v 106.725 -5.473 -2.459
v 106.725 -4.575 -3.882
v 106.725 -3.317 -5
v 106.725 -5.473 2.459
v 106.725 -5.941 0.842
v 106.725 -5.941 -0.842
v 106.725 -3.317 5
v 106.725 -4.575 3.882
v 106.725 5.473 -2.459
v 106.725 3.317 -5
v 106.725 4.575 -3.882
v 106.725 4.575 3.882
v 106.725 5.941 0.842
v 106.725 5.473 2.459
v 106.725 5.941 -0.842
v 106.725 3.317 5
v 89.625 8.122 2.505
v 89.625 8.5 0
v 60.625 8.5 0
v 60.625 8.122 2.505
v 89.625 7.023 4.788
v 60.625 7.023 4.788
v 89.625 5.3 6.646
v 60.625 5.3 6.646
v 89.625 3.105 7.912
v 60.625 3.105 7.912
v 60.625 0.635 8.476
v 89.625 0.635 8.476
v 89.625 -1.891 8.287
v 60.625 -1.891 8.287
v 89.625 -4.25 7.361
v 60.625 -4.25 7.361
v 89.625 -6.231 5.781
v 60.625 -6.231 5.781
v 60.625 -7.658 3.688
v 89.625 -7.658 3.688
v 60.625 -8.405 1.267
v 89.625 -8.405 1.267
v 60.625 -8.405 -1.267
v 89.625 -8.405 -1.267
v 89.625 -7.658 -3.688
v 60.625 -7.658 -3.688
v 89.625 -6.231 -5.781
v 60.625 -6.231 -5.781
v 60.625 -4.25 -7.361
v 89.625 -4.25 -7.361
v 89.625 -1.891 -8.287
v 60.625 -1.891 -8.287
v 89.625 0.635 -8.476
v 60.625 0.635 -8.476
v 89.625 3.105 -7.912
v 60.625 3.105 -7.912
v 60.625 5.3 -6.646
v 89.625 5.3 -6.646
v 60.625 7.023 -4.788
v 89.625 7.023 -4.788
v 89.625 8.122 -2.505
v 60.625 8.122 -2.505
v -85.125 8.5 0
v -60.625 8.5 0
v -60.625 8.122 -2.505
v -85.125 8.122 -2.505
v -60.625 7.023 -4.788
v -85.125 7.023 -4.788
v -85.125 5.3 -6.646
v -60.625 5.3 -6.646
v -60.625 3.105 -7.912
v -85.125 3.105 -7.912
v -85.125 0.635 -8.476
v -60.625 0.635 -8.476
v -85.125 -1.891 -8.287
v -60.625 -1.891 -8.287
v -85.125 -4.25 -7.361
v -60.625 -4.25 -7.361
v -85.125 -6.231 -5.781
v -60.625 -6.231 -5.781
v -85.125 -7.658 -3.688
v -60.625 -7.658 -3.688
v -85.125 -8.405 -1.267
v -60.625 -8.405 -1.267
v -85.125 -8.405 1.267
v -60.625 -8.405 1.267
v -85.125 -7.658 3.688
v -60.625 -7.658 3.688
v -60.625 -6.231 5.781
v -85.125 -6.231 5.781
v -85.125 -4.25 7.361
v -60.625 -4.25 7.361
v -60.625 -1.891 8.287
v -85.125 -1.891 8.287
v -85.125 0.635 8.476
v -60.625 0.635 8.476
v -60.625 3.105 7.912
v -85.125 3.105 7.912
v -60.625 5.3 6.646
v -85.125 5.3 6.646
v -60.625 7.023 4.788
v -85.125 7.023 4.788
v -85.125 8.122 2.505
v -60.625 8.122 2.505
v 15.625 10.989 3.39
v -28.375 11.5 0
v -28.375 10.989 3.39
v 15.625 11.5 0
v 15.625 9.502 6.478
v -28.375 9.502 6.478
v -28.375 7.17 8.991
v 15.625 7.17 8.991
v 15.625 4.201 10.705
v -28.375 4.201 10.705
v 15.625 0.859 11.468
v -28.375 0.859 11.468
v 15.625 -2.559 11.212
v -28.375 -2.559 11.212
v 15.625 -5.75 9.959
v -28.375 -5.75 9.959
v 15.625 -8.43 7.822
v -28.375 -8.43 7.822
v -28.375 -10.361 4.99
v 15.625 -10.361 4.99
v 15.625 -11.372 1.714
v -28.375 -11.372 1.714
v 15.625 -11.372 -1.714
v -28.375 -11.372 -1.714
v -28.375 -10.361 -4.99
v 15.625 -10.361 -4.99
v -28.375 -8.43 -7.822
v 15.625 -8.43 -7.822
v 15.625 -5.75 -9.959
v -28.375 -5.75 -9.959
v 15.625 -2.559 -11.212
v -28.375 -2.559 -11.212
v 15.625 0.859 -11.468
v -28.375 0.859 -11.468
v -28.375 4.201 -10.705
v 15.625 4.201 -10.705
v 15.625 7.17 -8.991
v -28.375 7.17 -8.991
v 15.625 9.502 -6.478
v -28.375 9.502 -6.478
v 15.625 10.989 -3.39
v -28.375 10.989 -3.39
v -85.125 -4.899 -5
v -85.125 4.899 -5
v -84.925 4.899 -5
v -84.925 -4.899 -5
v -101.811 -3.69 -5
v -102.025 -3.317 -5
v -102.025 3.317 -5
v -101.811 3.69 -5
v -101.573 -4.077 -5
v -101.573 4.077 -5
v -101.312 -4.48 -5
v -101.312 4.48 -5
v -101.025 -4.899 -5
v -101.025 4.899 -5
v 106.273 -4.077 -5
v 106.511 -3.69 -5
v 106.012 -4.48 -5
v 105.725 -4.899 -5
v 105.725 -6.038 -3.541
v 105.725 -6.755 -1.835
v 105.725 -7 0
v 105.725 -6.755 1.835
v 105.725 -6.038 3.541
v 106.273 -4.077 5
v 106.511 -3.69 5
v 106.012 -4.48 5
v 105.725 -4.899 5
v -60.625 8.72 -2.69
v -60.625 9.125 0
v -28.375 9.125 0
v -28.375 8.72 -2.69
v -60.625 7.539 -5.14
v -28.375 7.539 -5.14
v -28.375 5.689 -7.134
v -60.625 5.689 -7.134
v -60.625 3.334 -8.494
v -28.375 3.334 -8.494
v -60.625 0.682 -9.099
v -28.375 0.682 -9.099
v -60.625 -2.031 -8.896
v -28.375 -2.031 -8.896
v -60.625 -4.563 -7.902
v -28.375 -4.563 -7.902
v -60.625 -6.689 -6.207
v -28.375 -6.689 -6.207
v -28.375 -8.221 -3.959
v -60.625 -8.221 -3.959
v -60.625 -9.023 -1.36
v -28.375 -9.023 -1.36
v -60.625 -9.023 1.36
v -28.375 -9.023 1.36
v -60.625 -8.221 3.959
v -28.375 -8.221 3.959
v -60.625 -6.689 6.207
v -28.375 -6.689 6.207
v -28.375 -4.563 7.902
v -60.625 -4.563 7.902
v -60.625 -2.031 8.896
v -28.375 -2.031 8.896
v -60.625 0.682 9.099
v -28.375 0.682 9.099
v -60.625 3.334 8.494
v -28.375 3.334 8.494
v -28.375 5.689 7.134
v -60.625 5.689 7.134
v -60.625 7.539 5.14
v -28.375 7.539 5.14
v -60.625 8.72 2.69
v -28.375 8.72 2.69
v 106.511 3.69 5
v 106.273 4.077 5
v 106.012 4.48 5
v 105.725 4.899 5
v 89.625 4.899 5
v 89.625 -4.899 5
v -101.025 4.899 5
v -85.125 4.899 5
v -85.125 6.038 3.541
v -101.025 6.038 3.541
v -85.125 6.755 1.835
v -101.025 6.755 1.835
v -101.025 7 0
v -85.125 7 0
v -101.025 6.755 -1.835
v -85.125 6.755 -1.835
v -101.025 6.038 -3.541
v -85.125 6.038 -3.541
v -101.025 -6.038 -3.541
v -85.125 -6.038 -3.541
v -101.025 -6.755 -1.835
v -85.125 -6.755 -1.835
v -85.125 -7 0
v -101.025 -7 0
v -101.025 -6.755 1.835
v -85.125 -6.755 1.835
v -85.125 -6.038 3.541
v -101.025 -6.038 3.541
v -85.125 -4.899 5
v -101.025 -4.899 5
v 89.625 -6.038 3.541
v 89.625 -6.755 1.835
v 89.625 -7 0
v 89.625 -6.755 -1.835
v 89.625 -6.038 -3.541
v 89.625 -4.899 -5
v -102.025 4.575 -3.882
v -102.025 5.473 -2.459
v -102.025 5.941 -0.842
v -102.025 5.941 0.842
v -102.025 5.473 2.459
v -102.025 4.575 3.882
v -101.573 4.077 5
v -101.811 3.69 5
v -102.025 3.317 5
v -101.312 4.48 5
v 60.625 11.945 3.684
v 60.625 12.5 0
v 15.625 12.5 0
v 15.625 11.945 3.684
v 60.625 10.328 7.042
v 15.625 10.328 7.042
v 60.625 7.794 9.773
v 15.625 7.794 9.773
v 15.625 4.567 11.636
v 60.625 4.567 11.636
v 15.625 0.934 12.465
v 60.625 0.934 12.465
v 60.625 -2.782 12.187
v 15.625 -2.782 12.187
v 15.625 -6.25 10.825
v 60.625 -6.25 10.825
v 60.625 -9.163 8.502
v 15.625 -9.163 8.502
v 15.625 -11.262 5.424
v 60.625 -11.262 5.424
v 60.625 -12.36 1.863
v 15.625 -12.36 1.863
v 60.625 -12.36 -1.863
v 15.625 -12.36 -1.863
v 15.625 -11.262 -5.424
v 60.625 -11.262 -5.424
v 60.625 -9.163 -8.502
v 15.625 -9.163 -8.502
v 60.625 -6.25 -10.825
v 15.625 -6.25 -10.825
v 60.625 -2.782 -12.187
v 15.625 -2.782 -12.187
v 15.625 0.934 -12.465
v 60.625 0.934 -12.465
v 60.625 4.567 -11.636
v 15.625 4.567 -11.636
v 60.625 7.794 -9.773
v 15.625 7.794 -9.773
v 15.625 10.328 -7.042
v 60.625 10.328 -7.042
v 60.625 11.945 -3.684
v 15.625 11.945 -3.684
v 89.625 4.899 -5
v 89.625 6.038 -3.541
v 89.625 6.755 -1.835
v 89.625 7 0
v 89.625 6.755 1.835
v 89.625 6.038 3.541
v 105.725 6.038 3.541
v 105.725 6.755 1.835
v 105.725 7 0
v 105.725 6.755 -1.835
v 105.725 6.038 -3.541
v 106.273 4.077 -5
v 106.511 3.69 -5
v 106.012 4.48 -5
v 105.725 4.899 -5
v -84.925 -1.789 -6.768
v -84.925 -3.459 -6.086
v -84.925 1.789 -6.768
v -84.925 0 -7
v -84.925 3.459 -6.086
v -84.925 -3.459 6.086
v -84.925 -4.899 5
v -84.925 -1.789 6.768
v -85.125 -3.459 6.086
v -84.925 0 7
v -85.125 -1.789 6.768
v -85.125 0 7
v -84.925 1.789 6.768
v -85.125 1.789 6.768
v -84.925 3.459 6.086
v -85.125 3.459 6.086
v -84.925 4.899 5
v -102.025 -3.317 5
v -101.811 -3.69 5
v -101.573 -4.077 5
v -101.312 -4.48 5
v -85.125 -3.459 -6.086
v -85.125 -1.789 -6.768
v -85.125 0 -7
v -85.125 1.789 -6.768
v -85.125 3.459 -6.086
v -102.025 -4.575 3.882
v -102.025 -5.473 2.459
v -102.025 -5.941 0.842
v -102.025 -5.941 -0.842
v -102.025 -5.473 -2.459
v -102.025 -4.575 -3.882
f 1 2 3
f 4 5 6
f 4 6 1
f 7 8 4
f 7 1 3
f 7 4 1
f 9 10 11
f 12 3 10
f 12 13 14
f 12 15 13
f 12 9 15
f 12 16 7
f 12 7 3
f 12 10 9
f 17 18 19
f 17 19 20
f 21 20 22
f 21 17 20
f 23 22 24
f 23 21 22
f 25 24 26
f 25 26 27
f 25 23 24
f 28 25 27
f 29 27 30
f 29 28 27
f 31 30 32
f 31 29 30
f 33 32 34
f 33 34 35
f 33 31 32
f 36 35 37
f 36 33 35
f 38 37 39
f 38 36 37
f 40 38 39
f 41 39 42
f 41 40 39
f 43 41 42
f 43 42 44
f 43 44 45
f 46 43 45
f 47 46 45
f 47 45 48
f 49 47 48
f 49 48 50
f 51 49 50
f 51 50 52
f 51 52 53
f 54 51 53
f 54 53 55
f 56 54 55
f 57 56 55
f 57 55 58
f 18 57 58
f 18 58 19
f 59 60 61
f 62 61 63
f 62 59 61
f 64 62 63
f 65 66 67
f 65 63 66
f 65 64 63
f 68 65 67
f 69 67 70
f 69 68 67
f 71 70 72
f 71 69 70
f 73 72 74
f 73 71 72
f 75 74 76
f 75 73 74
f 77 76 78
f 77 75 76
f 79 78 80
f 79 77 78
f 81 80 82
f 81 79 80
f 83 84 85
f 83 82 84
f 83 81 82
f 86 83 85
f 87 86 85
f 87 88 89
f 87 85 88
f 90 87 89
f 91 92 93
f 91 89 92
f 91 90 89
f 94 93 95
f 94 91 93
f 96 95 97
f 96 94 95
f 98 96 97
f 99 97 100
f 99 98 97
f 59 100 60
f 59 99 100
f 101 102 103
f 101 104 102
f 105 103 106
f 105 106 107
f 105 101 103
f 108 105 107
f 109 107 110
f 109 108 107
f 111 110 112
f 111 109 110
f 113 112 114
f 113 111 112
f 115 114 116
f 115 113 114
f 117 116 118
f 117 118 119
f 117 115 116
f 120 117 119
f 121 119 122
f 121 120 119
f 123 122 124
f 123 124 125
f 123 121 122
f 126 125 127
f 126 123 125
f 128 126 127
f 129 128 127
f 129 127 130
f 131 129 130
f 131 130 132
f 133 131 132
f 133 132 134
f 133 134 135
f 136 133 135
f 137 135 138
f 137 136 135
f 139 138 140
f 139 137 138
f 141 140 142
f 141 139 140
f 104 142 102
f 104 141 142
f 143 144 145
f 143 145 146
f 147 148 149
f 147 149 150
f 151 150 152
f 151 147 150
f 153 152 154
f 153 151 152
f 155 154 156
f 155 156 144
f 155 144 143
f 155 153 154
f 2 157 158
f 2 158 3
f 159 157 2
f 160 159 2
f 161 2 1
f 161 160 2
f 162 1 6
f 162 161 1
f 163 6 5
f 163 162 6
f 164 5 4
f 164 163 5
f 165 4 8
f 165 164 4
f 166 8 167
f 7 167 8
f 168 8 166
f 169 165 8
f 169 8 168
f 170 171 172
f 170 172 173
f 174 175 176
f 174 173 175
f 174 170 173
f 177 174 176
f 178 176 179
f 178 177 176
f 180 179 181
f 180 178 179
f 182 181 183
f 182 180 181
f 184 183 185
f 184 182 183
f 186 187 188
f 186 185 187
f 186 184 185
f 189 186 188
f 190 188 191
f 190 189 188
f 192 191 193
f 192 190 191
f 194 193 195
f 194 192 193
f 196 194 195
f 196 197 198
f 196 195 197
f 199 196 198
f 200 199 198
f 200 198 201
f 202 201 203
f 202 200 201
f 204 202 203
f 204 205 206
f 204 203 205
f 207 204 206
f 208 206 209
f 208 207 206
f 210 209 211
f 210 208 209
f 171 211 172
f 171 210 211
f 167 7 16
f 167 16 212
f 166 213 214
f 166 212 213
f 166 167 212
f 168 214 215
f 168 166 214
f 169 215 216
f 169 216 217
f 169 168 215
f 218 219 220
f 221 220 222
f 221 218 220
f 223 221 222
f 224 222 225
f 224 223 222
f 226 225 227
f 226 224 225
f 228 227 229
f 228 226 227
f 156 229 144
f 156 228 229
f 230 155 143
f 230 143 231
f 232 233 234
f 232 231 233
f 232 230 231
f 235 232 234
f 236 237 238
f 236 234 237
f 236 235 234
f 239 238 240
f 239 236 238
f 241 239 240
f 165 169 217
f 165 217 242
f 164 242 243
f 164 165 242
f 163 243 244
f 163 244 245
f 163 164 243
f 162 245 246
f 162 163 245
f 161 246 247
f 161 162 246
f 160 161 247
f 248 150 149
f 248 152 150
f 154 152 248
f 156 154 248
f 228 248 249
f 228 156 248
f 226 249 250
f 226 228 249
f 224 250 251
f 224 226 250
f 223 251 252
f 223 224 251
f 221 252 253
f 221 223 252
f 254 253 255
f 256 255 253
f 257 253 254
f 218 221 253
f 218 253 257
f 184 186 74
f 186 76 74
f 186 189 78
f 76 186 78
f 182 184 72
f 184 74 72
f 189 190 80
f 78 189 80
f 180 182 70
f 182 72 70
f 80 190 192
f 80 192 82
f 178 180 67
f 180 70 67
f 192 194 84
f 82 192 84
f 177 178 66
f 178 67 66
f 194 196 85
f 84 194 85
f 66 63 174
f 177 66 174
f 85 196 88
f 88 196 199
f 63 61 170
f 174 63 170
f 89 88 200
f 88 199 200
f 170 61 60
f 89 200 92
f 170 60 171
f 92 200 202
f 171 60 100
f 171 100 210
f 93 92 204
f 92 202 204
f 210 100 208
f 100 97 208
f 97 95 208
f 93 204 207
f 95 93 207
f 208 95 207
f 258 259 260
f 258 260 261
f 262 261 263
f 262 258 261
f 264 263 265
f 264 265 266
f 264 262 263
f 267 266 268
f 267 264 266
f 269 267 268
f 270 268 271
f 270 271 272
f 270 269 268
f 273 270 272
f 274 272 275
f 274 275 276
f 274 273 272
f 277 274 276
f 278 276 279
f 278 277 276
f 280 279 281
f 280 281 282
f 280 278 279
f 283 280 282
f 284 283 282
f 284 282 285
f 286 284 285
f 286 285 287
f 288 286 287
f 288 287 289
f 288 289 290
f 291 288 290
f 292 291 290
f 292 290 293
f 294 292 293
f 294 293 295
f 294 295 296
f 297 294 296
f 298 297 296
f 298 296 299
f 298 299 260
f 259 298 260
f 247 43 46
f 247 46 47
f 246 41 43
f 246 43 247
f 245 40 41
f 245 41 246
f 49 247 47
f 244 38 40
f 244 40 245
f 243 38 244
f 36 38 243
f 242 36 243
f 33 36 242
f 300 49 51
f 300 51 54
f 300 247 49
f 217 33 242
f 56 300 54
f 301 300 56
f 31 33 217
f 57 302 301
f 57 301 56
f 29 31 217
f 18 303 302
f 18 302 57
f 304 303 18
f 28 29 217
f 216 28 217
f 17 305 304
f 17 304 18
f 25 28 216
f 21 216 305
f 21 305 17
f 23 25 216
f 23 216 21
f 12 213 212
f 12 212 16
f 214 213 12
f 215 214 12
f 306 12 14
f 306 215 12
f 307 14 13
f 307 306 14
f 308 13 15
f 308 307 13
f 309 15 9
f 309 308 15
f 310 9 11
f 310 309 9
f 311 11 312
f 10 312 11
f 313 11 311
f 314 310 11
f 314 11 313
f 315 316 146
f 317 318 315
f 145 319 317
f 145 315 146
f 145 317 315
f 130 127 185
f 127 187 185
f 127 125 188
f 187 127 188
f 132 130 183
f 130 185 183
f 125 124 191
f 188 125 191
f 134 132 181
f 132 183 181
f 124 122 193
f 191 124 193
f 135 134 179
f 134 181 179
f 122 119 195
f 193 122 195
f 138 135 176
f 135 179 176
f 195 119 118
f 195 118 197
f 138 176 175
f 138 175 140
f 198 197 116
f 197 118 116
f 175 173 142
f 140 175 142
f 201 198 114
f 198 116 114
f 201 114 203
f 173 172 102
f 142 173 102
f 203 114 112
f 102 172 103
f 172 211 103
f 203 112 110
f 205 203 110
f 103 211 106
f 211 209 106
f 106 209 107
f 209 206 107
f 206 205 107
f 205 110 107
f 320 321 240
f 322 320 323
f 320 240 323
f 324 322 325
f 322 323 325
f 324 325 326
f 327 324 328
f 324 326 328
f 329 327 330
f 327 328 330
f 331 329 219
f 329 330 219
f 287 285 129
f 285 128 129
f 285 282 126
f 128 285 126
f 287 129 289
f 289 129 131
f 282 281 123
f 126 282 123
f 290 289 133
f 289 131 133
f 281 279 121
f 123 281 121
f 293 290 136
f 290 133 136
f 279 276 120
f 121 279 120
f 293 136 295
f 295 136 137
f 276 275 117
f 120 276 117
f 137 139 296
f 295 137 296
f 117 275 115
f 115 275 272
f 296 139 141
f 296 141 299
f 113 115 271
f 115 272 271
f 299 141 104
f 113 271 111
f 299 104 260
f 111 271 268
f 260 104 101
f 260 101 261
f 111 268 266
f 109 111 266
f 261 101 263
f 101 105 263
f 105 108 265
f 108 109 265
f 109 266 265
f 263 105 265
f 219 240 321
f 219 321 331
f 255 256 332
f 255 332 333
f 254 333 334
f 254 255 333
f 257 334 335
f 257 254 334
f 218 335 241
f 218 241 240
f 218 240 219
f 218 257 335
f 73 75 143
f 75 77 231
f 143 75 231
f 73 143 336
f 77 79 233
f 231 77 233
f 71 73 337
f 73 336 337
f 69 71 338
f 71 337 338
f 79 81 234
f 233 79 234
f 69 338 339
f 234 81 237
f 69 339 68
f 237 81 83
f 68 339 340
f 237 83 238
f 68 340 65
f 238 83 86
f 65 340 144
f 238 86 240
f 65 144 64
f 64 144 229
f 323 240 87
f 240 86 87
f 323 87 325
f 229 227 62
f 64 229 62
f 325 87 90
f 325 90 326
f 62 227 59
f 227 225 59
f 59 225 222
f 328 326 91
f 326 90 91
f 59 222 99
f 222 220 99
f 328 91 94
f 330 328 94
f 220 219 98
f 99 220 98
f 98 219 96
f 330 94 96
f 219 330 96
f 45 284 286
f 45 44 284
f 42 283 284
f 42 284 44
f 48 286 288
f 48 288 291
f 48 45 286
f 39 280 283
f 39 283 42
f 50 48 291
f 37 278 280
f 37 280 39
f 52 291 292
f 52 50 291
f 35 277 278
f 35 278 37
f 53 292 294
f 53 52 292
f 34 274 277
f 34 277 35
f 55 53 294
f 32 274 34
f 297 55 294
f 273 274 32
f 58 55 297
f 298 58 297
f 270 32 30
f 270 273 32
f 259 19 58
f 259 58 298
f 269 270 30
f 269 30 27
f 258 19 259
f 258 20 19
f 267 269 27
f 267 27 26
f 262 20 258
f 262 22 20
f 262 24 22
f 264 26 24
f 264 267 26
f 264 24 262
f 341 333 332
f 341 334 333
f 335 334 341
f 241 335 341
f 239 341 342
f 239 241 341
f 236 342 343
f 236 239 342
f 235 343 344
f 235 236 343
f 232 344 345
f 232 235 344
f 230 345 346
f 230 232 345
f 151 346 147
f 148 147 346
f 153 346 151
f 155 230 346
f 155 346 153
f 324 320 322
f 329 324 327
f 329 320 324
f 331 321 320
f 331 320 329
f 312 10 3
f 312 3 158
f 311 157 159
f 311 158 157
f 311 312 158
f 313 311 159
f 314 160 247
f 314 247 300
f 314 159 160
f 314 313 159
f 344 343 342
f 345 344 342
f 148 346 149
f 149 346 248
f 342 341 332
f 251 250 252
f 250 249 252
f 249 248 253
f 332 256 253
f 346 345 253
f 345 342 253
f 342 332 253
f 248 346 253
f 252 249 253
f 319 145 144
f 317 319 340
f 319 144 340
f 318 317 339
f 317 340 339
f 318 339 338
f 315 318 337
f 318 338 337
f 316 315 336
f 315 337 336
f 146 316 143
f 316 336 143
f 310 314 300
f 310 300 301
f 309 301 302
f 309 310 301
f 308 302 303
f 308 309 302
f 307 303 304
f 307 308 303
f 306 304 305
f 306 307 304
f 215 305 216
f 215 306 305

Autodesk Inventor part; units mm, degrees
ref_plane "YZ Plane" through (0, 0, 0) normal (1, 0, 0) x (0, 1, 0)
ref_plane "XZ Plane" through (0, 0, 0) normal (0, 1, 0) x (-1, 0, 0)
ref_plane "XY Plane" through (0, 0, 0) normal (0, 0, 1) x (1, 0, 0)
sketch "Sketch4" plane through (0, 0, 0) normal (0, 0, 1) x (1, 0, 0)
  line L0 (-102.025, 0) -> (106.725, 0)
  line L1 (-28.375, 11.5) -> (15.625, 11.5)
  line L2 (15.625, 11.5) -> (15.625, 12.5)
  line L3 (15.625, 12.5) -> (60.625, 12.5)
  line L4 (60.625, 12.5) -> (60.625, 8.5)
  line L5 (60.625, 8.5) -> (89.625, 8.5)
  line L6 (89.625, 8.5) -> (89.625, 7)
  line L7 (89.625, 7) -> (106.725, 7)
  line L8 (106.725, 7) -> (106.725, 0)
  line L9 (-28.375, 11.5) -> (-28.375, 9.125)
  line L10 (-28.375, 9.125) -> (-60.625, 9.125)
  line L11 (-60.625, 9.125) -> (-60.625, 8.5)
  line L12 (-60.625, 8.5) -> (-85.125, 8.5)
  line L13 (-85.125, 8.5) -> (-85.125, 7)
  line L14 (-85.125, 7) -> (-102.025, 7)
  line L15 (-102.025, 7) -> (-102.025, 0)
  line L16 (0, 0) -> (0, 42.8251) construction
  dimension "d12" = 14
  dimension "d13" = 17
  dimension "d16" = 23
  dimension "d18" = 25
  dimension "d20" = 18.25
  dimension "d30" = 89
  dimension "d31" = 45
  dimension "d32" = 29
  dimension "d33" = 17.1
  dimension "d34" = 32.25
  dimension "d35" = 24.5
  dimension "d36" = 16.9
revolve "Revolution1" add sketch "Sketch4" angle 360 about axis through (-102.025, 0, 0) along (1, 0, 0)
chamfer "Chamfer1" distance 1 angle 45 2 edges at (106.725, -7, 0) (-102.025, -7, 0)
sketch "Sketch5" plane through (106.725, 0, 0) normal (1, 0, 0) x (0, 0, -1)
  circle A0 centre (0, 0) radius 7 projected
  line L0 (-5, 4.899) -> (-5, -4.899)
  line L1 (5, -4.899) -> (5, 4.899)
  point P0 (0, 0)
  dimension "d27" = 10
extrude "Extrusion4" cut sketch "Sketch5" against normal up to surface (17.1 mm away) contours A0 L1 | L0 A0
ref_plane "Work Plane1" through (2.35, -3.3166, -5) normal (1, 0, 0) x (0, 0, -1)
mirror "Mirror1" about plane through (2.35, -3.3166, -5) normal (1, 0, 0) of "Extrusion4"
properties part number "axel" material "Stainless Steel"
